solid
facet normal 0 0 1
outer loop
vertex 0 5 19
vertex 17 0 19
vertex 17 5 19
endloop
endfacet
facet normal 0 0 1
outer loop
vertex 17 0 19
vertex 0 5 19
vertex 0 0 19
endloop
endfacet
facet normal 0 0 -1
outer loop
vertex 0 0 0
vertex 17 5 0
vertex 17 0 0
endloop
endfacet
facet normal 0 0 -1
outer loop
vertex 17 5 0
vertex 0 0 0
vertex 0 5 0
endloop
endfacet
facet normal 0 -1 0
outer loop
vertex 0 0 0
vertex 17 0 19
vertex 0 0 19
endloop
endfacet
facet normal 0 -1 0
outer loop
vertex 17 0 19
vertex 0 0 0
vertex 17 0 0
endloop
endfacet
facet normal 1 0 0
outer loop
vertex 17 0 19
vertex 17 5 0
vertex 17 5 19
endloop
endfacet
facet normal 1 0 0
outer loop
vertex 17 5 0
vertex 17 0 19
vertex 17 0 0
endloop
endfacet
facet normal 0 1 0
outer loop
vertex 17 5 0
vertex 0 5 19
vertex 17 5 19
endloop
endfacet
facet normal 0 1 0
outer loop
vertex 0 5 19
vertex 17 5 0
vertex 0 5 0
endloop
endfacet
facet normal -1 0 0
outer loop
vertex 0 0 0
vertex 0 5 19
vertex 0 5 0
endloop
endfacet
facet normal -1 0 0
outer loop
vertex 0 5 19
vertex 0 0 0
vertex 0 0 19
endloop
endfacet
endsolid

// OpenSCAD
// Generated by SolidPython 1.0.1 on 2020-07-29 00:46:56


cube(size = [17, 5, 19]);
/***********************************************
*********      SolidPython code:      **********
************************************************
 
# import packages: SolidPython
from solid import *
from solid.utils import *
from itertools import chain, combinations, permutations


class Resize:

    def __init__(self, scad_file):
        self.scad_file = scad_file
        #self.scad_file = import_scad(scad_file)
        # cone/cylinder param:
        self.r1 = 0
        self.r2 = 0
        self.h = 0
        # rectangular prism param:
        self.w = 0
        self.l = 0
        # ellipse param:
        self.r = 0

    # import OpenScad code (file name corresponds to shape)


    # classify shape + parameters
    def assign(self, param1, param2, param3):
        if self.scad_file == 'cone.scad':
            self.r1 = param1
            self.r2 = param2
            self.h = param3
        elif self.scad_file == 'cylinder.scad':
            self.r1 = param1
            self.r2 = param2
            self.h = param3
        elif self.scad_file == 'rectangularPrism.scad':
            self.h = param1
            self.l = param2
            self.w = param3
        else:
            self.r = param1
            self.h = param2

    # resize parameters
    def iterate(self):
        x = range(3, 20, 2)
        i = 1
        if self.scad_file == 'cone.scad':
            tempList = list(permutations(x, 2))
            for temp in tempList:
                param1 = temp[0]
                param2 = temp[1]
                filepath = 'produced_scad_files/' + 'cone' + str(param1) + '_' + str(param2) + '_' + '.scad'
                scad_render_to_file(cylinder(h=param1, r1=param2, r2=0), filepath)

        elif self.scad_file == 'cylinder.scad':
            tempList = list(permutations(x, 3))
            for temp in tempList:
                param1 = temp[0]
                param2 = temp[1]
                filepath = 'produced_scad_files/' + 'cylinder' + str(param1) + '_' + str(param2) + '_' + '.scad'
                scad_render_to_file(cylinder(h=param1, r1=param2, r2=param2), filepath)

        elif self.scad_file == 'rectangularPrism.scad':
            tempList = list(permutations(x, 3))
            for temp in tempList:
                param1 = temp[0]
                param2 = temp[1]
                param3 = temp[2]
                filepath = 'produced_scad_files/' + 'rectangularPrism' + str(param1) + '_' + str(param2) + '_' + str(
                    param3) + '.scad'
                scad_render_to_file(cube(size=(param1, param2, param3)), filepath)

        elif self.scad_file == 'ellipse.scad':
            tempList = list(permutations(x, 4))
            for temp in tempList:
                param1 = temp[0]
                param2 = temp[1]
                param3 = temp[2]
                param4 = temp[3]
                filepath = 'produced_scad_files/' + 'ellipse' + str(param1) + '_' + str(param2) + '_' + str(param3) + '_' + str(param4) + '.scad'
                scad_render_to_file(scale([param1, param2, param3])(sphere(r=param4)), filepath)

    def render_to_scadfile(self):
        scad_render_to_file(scad, 'example.scad') 
 
************************************************/
